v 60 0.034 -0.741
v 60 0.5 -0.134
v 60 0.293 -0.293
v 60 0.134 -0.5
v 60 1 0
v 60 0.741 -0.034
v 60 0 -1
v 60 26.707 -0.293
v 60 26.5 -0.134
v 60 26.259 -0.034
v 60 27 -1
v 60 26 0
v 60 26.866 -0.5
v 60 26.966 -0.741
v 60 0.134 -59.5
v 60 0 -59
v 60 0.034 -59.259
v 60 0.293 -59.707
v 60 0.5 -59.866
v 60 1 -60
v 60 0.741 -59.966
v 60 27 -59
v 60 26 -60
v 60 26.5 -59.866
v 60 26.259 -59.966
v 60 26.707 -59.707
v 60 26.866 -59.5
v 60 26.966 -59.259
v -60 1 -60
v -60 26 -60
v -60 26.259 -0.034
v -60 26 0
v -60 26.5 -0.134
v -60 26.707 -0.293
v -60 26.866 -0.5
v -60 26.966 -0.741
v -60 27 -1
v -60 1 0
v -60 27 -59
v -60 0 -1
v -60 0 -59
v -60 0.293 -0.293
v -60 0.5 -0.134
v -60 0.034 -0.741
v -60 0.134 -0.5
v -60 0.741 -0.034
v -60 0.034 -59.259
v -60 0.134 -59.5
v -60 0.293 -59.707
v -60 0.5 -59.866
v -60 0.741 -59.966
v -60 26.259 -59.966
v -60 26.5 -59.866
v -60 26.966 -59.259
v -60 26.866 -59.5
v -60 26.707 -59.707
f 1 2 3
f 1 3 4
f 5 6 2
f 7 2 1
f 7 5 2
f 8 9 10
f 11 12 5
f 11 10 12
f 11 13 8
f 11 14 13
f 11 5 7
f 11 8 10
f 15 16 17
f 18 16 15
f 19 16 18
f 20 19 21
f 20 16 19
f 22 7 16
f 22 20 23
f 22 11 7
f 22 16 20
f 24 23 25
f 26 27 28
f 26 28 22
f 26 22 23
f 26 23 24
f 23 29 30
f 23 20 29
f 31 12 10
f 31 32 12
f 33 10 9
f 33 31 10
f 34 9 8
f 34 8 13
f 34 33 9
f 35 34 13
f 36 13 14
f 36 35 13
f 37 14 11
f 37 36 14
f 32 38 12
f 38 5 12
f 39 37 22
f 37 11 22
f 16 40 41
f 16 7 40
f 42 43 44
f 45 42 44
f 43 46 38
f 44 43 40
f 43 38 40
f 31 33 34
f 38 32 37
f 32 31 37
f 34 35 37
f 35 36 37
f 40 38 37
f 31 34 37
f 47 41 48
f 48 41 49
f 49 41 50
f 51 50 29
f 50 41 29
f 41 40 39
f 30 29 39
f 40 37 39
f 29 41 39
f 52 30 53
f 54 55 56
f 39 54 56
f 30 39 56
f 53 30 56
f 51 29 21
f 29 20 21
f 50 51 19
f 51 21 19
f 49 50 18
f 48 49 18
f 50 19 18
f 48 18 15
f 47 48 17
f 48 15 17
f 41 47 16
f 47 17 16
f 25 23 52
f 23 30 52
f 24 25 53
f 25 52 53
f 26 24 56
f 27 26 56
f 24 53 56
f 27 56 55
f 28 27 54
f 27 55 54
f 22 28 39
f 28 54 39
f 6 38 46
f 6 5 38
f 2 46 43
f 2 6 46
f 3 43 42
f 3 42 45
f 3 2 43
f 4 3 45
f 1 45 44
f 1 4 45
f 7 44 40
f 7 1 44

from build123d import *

# Parameters (mm, degrees)
SKETCH2_W           = 60
SKETCH2_H           = 27
BOSS_EXTRUDE1_DEPTH = 60
FILLET1_R           = 1


with BuildPart() as part:
    # Sketch2 → Boss-Extrude1 (new body, symmetric)
    with BuildSketch(Plane(origin=(0, 0, 0), x_dir=(0, 0, -1), z_dir=(1, 0, 0))):
        with Locations((30, 13.5)):
            Rectangle(SKETCH2_W, SKETCH2_H)
    extrude(amount=BOSS_EXTRUDE1_DEPTH, both=True)

    # Fillet1
    fillet1_edges = [part.edges().sort_by_distance(p)[0] for p in [
        (0, 27, 0),
        (0, 27, -60),
        (0, 0, -60),
        (0, 0, 0),
    ]]
    fillet(fillet1_edges, radius=FILLET1_R)


solid = part.part
